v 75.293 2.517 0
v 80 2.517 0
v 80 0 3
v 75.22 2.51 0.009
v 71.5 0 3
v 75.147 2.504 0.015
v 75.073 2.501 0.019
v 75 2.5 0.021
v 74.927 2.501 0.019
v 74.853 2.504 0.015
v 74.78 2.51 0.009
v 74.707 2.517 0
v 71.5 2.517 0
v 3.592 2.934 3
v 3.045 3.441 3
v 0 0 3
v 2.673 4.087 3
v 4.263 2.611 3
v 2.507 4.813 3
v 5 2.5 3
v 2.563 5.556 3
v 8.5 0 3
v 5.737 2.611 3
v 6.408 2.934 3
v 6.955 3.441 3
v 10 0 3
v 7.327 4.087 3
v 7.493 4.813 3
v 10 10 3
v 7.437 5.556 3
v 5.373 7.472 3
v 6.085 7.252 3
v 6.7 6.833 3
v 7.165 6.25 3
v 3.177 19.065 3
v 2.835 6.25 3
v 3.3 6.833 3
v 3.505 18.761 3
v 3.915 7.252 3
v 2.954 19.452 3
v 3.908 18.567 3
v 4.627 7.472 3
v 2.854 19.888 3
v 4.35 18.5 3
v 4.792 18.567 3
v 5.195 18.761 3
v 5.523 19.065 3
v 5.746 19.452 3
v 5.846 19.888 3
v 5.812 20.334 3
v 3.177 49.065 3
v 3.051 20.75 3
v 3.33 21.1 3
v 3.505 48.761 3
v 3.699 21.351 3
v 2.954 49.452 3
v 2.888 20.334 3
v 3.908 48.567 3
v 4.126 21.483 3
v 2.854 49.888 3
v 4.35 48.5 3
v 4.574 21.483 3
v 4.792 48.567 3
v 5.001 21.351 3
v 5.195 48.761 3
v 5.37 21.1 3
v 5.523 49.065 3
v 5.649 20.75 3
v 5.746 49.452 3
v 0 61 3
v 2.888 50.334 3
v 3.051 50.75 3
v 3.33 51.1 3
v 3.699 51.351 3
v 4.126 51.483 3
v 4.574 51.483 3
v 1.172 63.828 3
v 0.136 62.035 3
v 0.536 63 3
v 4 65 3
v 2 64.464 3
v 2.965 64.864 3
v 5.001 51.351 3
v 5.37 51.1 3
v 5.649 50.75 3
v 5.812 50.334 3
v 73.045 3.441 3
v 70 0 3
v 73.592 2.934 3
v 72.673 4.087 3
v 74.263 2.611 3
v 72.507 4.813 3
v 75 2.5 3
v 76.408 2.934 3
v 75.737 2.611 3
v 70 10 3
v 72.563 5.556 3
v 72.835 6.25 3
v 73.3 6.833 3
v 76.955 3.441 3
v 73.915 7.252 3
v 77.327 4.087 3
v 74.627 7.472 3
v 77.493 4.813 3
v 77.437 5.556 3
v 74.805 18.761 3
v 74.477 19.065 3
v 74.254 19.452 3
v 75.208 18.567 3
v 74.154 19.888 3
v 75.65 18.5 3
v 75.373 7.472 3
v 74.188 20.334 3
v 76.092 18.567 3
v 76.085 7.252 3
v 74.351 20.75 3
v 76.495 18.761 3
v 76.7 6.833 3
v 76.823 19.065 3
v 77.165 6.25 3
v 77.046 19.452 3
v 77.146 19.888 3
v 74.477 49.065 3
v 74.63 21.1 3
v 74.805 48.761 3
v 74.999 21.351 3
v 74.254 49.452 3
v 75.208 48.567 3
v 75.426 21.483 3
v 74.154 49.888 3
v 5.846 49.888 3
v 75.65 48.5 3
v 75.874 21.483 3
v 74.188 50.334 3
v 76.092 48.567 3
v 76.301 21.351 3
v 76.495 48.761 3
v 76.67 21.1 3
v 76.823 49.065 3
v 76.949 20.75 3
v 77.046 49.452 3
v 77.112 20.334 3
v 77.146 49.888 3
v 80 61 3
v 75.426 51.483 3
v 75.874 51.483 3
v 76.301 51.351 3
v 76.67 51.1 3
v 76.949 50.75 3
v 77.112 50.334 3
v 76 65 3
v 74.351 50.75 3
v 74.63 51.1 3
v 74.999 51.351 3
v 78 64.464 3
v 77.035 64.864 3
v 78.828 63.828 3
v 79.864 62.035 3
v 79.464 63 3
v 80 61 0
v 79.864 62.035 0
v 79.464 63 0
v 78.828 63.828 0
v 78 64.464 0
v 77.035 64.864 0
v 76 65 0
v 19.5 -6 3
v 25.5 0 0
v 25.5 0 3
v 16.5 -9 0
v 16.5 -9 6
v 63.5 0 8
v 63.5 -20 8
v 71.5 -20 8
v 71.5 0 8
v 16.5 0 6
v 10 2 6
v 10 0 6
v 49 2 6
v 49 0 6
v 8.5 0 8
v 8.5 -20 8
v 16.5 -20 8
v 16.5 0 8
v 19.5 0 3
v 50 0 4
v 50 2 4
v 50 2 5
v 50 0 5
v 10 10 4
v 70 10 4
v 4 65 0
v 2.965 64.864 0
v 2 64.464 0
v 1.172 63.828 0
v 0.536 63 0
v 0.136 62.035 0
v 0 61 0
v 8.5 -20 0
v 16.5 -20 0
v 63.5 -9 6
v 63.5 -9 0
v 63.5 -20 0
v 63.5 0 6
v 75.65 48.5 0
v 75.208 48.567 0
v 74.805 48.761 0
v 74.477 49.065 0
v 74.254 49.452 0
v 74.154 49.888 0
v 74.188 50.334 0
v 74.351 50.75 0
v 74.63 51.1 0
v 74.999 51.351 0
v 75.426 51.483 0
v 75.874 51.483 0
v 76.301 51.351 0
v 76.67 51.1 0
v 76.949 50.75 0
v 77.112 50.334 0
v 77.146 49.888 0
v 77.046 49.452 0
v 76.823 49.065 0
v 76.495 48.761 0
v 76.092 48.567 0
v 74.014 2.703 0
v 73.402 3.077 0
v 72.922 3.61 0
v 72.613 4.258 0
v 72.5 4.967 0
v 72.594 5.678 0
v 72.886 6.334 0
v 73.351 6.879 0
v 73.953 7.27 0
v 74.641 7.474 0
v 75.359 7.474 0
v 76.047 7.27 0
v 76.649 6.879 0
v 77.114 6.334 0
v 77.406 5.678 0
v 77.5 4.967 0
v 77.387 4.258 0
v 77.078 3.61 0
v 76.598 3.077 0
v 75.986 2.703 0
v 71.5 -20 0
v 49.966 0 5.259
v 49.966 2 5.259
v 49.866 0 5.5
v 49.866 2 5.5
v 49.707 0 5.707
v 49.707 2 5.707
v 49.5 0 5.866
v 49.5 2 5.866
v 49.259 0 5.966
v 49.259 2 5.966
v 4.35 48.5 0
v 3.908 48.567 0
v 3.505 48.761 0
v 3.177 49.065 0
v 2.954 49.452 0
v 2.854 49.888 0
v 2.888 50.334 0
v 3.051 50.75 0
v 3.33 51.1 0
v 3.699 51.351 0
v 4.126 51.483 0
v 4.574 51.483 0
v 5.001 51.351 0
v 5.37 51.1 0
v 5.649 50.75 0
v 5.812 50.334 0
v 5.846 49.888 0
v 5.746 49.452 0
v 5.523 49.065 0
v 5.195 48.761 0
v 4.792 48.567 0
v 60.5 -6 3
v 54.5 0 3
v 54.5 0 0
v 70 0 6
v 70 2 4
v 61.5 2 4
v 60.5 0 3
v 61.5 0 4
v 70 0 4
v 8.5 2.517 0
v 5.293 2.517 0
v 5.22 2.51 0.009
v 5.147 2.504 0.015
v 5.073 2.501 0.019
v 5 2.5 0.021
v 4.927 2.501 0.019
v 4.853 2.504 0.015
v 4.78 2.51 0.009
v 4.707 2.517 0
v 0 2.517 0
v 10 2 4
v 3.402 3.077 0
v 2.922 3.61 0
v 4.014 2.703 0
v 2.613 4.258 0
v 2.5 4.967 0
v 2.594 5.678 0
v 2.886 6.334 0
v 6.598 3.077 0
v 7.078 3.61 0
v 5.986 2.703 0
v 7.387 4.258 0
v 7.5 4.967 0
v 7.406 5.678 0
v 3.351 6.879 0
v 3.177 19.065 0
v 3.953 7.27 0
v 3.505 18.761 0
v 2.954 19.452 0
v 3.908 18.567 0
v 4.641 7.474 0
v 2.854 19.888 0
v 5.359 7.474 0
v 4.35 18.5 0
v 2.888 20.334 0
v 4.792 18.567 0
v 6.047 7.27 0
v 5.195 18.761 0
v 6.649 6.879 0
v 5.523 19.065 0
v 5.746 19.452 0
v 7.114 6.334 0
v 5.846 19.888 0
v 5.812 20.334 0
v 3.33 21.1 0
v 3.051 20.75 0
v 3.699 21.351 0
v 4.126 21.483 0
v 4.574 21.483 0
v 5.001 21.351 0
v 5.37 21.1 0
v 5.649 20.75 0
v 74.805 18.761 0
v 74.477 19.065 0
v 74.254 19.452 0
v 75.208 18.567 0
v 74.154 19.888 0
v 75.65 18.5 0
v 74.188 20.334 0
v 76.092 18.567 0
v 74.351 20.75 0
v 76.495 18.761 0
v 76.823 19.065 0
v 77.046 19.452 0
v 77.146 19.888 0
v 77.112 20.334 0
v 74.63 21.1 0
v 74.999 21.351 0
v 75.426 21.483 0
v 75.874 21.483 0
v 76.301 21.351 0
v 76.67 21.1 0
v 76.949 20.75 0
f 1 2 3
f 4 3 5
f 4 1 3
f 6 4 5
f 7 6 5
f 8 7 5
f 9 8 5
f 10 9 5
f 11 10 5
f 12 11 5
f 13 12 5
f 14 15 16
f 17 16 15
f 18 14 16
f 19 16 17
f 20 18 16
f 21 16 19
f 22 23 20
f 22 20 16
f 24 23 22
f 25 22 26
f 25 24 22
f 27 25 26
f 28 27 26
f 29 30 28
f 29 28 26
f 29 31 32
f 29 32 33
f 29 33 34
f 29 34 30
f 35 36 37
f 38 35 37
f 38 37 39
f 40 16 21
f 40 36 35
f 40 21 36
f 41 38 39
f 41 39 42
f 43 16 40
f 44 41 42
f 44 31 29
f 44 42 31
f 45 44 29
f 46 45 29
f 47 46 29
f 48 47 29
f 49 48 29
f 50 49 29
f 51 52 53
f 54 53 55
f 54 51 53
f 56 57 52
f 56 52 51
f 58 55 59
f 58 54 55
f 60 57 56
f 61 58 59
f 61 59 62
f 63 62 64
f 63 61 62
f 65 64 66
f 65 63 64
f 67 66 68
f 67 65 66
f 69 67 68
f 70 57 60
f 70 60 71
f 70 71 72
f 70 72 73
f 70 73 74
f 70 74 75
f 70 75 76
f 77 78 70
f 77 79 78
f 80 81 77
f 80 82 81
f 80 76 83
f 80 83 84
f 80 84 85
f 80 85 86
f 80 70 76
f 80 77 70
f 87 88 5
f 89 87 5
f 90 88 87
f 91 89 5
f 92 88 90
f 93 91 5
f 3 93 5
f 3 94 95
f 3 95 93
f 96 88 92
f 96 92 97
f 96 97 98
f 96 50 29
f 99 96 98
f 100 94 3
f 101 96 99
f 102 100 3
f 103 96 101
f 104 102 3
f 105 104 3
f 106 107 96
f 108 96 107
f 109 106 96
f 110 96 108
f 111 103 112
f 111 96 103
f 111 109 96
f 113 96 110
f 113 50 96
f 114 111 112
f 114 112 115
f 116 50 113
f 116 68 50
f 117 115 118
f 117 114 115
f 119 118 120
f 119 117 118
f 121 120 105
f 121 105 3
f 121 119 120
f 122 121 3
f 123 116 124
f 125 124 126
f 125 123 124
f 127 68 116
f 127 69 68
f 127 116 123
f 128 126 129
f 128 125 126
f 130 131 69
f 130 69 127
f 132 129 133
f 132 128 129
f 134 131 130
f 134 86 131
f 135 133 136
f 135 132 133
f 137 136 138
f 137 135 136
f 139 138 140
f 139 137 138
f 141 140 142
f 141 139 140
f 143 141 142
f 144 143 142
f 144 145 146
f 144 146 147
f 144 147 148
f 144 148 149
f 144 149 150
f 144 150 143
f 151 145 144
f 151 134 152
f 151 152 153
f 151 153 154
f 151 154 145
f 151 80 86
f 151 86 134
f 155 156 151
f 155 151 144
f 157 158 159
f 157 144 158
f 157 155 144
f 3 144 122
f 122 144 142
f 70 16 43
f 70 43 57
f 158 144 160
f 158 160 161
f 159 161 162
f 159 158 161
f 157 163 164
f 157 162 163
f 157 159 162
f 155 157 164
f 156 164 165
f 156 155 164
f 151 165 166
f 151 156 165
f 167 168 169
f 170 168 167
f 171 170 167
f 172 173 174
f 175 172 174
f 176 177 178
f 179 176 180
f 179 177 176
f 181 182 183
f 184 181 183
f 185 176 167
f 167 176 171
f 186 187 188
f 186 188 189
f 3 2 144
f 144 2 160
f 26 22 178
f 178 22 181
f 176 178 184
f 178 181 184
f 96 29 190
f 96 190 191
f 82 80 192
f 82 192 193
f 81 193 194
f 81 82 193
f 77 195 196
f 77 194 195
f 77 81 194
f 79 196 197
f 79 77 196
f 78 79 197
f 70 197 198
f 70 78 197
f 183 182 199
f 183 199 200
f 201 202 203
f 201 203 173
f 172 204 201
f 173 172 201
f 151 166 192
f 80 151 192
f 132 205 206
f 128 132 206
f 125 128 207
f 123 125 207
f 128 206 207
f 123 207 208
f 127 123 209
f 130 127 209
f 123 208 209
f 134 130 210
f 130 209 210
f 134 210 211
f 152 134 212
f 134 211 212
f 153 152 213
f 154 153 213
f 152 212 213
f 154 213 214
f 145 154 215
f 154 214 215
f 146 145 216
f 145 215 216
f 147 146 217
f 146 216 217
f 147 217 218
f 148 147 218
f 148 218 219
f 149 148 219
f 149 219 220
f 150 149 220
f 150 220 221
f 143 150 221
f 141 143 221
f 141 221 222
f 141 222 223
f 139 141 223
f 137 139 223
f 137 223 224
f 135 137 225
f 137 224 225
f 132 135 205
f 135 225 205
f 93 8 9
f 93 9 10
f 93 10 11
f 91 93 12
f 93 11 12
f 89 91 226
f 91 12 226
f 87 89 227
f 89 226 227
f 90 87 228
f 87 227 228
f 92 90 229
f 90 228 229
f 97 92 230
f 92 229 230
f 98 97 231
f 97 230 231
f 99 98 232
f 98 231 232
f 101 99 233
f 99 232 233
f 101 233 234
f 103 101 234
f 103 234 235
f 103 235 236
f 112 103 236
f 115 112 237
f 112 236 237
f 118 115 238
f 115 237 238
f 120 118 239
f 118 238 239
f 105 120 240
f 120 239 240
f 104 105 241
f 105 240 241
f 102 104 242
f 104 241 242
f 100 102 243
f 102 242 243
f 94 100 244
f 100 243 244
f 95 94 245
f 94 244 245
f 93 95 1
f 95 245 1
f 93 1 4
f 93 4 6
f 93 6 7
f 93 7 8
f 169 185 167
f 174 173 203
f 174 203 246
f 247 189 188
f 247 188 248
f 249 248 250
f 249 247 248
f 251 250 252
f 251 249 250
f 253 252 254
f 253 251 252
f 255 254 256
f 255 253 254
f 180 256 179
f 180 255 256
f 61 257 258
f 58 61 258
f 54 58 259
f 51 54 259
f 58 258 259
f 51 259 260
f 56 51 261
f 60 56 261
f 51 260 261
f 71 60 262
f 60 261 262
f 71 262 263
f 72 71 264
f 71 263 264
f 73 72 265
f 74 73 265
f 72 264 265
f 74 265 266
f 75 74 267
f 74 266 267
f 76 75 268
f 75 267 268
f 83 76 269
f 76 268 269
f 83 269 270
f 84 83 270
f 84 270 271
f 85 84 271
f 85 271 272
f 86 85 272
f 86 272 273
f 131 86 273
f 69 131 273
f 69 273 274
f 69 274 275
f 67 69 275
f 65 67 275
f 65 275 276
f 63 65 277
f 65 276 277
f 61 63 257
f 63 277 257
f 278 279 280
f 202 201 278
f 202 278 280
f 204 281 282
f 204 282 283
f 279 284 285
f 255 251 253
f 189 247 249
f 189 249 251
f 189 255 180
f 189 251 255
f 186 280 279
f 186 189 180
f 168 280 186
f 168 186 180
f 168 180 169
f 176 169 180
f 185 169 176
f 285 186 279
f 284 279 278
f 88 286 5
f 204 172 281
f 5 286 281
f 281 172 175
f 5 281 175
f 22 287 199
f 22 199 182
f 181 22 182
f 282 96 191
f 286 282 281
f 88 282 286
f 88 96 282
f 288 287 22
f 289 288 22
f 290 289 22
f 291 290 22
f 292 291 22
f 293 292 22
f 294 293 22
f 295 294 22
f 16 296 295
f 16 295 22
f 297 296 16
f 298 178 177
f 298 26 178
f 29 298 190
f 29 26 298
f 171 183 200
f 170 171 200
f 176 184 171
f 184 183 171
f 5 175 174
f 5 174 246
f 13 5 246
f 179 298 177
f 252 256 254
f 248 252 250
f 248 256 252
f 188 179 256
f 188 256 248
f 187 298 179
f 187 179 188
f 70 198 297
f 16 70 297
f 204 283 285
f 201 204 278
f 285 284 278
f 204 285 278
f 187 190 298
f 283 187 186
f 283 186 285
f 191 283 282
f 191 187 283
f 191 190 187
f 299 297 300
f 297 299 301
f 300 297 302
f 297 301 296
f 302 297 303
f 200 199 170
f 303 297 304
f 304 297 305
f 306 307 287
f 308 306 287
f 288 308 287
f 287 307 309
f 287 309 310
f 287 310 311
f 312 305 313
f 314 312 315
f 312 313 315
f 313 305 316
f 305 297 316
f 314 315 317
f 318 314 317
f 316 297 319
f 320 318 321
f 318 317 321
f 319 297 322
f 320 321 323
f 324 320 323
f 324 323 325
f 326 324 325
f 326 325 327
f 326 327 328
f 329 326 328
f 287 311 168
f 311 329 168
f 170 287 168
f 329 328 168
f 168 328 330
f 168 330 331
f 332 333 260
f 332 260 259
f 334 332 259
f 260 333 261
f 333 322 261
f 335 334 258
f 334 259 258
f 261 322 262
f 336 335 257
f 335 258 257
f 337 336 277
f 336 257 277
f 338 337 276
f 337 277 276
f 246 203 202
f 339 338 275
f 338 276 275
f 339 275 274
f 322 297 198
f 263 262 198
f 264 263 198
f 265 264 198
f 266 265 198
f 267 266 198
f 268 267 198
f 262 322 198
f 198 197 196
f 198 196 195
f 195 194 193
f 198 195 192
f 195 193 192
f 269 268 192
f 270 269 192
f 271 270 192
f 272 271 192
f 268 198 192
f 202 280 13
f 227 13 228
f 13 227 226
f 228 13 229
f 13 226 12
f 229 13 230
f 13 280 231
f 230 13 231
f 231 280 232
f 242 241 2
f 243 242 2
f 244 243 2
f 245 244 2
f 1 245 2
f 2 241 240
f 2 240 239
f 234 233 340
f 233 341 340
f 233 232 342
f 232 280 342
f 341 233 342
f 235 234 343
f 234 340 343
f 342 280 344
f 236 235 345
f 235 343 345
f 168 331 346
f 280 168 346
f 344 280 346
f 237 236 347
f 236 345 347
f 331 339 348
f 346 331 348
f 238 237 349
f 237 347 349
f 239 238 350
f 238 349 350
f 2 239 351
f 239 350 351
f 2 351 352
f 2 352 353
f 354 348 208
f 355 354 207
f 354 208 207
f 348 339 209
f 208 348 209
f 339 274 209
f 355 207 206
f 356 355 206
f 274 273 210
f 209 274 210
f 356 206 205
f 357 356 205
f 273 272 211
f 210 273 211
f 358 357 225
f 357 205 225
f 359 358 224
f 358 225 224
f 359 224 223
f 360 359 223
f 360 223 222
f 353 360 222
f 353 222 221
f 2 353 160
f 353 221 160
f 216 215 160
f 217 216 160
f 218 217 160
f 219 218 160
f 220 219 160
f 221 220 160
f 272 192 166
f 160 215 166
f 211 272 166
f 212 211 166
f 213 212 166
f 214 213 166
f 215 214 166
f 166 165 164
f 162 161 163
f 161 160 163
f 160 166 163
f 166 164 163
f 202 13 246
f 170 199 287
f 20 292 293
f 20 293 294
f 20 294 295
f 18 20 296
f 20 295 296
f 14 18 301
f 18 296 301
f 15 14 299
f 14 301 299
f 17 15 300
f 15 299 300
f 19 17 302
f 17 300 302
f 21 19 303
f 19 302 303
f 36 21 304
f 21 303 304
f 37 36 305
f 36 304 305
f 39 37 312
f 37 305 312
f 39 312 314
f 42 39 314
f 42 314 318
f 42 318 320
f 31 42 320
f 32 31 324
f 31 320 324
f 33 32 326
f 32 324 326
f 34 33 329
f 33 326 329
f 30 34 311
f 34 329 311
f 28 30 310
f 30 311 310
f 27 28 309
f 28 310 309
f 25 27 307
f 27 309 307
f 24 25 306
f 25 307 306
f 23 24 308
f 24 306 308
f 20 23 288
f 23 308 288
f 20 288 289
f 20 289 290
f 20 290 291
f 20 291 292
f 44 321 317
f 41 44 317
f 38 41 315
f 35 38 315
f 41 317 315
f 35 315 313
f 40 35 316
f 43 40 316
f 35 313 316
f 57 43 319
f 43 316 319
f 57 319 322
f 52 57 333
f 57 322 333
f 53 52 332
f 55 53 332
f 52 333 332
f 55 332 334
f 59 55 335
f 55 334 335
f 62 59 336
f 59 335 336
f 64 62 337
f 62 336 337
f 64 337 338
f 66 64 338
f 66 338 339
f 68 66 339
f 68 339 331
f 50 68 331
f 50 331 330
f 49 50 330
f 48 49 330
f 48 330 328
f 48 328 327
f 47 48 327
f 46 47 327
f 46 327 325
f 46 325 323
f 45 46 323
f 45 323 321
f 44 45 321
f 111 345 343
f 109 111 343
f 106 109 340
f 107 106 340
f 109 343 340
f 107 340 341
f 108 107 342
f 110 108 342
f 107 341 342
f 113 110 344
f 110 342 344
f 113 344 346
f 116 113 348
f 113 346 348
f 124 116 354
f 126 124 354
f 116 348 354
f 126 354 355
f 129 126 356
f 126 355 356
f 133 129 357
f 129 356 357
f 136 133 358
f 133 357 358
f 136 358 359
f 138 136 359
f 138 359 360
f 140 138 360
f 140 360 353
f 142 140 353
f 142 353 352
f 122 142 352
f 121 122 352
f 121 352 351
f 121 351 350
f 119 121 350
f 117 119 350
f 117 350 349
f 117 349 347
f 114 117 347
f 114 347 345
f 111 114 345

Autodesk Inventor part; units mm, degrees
ref_plane "YZ Plane" through (0, 0, 0) normal (1, 0, 0) x (0, 1, 0)
ref_plane "XZ Plane" through (0, 0, 0) normal (0, 1, 0) x (-1, 0, 0)
ref_plane "XY Plane" through (0, 0, 0) normal (0, 0, 1) x (1, 0, 0)
sketch "Skizze1" plane through (0, 0, 0) normal (0, 0, 1) x (1, 0, 0)
  line L0 (0, 0) -> (80, 0)
  line L1 (80, 0) -> (80, 65)
  line L2 (80, 65) -> (0, 65)
  line L3 (0, 65) -> (0, 0)
  dimension "d0" = 80
  dimension "d1" = 65
extrude "Extrusion2" add sketch "Skizze1" along normal blind 3
sketch "Skizze5" plane through (0, 0, 0) normal (0, -1, 0) x (1, 0, 0)
  line L0 (0, 0) -> (0, 3) projected
  line L1 (8.5, 8) -> (16.5, 8)
  line L2 (16.5, 8) -> (16.5, 0)
  line L3 (16.5, 0) -> (8.5, 0)
  line L4 (8.5, 0) -> (8.5, 8)
  line L5 (63.5, 8) -> (71.5, 8)
  line L6 (71.5, 8) -> (71.5, 0)
  line L7 (71.5, 0) -> (63.5, 0)
  line L8 (63.5, 0) -> (63.5, 8)
  line L9 (0, 0) -> (80, 0) projected
  dimension "d105" = 8
  dimension "d108" = 63
  dimension "d109" = 8.5
  dimension "d112" = 8
extrude "Extrusion5" add sketch "Skizze5" along normal blind 20
chamfer "Fase3" distance 9 angle 45 1 edges at (16.5, 0, 1.5)
chamfer "Fase4" distance 9 angle 45 1 edges at (63.5, 0, 1.5)
chamfer "Fase5" distance 3 angle 45 1 edges at (63.5, -4.5, 3)
chamfer "Fase6" distance 3 angle 45 1 edges at (16.5, -4.5, 3)
fillet "Rundung17" radius 4 2 edges at (0, 65, 1.5) (80, 65, 1.5)
sketch "Skizze13" plane through (0, 0, 3) normal (0, 0, 1) x (1, 0, 0)
  line L0 (10, 10) -> (70, 10)
  line L1 (70, 10) -> (70, 0)
  line L2 (70, 0) -> (10, 0)
  line L3 (10, 0) -> (10, 10)
  line L4 (0, 0) -> (8.5, 0) projected
  line L5 (80, 0) -> (80, 61) projected
  dimension "d0" = 80
  dimension "d257" = 60
  dimension "d258" = 10
  dimension "d259" = 10
extrude "Extrusion13" add sketch "Skizze13" along normal blind 1
sketch "Skizze15" plane through (0, 0, 4) normal (0, 0, 1) x (1, 0, 0)
  line L0 (10, 2) -> (50, 2)
  line L1 (50, 2) -> (50, 0)
  line L2 (50, 0) -> (10, 0)
  line L3 (10, 0) -> (10, 2)
  line L4 (0, 61) -> (0, 0) projected
  line L5 (0, 0) -> (8.5, 0) projected
  dimension "d189" = 40
  dimension "d190" = 2
  dimension "d191" = 10
extrude "Extrusion15" add sketch "Skizze15" along normal blind 2
fillet "Rundung19" radius 1 1 edges at (50, 1, 6)
chamfer "Fase13" distance 2.9999 angle 40 1 edges at (75.75, 0, 0) measured on face at (77.1667, 0, 2)
chamfer "Fase14" distance 2.9999 angle 40 1 edges at (4.25, 0, 0) measured on face at (2.8333, 0, 1)
hole "Bohrung5" at (5, 5, 3) direction (0, 0, -1) diameter 5 end through all
hole "Bohrung6" at (75, 5, 3) direction (0, 0, -1) diameter 5 end through all
hole "Bohrung7" at (4.35, 20, 3) direction (0, 0, -1) diameter 3 end through all
hole "Bohrung8" at (4.35, 50, 3) direction (0, 0, -1) diameter 3 end through all
hole "Bohrung9" at (75.65, 20, 3) direction (0, 0, -1) diameter 3 end through all
hole "Bohrung10" at (75.65, 50, 3) direction (0, 0, -1) diameter 3 end through all
chamfer "Fase16" distance 2 angle 45 1 edges at (65.75, 0, 4)
properties part number "Grundplatte_zerlegt"
